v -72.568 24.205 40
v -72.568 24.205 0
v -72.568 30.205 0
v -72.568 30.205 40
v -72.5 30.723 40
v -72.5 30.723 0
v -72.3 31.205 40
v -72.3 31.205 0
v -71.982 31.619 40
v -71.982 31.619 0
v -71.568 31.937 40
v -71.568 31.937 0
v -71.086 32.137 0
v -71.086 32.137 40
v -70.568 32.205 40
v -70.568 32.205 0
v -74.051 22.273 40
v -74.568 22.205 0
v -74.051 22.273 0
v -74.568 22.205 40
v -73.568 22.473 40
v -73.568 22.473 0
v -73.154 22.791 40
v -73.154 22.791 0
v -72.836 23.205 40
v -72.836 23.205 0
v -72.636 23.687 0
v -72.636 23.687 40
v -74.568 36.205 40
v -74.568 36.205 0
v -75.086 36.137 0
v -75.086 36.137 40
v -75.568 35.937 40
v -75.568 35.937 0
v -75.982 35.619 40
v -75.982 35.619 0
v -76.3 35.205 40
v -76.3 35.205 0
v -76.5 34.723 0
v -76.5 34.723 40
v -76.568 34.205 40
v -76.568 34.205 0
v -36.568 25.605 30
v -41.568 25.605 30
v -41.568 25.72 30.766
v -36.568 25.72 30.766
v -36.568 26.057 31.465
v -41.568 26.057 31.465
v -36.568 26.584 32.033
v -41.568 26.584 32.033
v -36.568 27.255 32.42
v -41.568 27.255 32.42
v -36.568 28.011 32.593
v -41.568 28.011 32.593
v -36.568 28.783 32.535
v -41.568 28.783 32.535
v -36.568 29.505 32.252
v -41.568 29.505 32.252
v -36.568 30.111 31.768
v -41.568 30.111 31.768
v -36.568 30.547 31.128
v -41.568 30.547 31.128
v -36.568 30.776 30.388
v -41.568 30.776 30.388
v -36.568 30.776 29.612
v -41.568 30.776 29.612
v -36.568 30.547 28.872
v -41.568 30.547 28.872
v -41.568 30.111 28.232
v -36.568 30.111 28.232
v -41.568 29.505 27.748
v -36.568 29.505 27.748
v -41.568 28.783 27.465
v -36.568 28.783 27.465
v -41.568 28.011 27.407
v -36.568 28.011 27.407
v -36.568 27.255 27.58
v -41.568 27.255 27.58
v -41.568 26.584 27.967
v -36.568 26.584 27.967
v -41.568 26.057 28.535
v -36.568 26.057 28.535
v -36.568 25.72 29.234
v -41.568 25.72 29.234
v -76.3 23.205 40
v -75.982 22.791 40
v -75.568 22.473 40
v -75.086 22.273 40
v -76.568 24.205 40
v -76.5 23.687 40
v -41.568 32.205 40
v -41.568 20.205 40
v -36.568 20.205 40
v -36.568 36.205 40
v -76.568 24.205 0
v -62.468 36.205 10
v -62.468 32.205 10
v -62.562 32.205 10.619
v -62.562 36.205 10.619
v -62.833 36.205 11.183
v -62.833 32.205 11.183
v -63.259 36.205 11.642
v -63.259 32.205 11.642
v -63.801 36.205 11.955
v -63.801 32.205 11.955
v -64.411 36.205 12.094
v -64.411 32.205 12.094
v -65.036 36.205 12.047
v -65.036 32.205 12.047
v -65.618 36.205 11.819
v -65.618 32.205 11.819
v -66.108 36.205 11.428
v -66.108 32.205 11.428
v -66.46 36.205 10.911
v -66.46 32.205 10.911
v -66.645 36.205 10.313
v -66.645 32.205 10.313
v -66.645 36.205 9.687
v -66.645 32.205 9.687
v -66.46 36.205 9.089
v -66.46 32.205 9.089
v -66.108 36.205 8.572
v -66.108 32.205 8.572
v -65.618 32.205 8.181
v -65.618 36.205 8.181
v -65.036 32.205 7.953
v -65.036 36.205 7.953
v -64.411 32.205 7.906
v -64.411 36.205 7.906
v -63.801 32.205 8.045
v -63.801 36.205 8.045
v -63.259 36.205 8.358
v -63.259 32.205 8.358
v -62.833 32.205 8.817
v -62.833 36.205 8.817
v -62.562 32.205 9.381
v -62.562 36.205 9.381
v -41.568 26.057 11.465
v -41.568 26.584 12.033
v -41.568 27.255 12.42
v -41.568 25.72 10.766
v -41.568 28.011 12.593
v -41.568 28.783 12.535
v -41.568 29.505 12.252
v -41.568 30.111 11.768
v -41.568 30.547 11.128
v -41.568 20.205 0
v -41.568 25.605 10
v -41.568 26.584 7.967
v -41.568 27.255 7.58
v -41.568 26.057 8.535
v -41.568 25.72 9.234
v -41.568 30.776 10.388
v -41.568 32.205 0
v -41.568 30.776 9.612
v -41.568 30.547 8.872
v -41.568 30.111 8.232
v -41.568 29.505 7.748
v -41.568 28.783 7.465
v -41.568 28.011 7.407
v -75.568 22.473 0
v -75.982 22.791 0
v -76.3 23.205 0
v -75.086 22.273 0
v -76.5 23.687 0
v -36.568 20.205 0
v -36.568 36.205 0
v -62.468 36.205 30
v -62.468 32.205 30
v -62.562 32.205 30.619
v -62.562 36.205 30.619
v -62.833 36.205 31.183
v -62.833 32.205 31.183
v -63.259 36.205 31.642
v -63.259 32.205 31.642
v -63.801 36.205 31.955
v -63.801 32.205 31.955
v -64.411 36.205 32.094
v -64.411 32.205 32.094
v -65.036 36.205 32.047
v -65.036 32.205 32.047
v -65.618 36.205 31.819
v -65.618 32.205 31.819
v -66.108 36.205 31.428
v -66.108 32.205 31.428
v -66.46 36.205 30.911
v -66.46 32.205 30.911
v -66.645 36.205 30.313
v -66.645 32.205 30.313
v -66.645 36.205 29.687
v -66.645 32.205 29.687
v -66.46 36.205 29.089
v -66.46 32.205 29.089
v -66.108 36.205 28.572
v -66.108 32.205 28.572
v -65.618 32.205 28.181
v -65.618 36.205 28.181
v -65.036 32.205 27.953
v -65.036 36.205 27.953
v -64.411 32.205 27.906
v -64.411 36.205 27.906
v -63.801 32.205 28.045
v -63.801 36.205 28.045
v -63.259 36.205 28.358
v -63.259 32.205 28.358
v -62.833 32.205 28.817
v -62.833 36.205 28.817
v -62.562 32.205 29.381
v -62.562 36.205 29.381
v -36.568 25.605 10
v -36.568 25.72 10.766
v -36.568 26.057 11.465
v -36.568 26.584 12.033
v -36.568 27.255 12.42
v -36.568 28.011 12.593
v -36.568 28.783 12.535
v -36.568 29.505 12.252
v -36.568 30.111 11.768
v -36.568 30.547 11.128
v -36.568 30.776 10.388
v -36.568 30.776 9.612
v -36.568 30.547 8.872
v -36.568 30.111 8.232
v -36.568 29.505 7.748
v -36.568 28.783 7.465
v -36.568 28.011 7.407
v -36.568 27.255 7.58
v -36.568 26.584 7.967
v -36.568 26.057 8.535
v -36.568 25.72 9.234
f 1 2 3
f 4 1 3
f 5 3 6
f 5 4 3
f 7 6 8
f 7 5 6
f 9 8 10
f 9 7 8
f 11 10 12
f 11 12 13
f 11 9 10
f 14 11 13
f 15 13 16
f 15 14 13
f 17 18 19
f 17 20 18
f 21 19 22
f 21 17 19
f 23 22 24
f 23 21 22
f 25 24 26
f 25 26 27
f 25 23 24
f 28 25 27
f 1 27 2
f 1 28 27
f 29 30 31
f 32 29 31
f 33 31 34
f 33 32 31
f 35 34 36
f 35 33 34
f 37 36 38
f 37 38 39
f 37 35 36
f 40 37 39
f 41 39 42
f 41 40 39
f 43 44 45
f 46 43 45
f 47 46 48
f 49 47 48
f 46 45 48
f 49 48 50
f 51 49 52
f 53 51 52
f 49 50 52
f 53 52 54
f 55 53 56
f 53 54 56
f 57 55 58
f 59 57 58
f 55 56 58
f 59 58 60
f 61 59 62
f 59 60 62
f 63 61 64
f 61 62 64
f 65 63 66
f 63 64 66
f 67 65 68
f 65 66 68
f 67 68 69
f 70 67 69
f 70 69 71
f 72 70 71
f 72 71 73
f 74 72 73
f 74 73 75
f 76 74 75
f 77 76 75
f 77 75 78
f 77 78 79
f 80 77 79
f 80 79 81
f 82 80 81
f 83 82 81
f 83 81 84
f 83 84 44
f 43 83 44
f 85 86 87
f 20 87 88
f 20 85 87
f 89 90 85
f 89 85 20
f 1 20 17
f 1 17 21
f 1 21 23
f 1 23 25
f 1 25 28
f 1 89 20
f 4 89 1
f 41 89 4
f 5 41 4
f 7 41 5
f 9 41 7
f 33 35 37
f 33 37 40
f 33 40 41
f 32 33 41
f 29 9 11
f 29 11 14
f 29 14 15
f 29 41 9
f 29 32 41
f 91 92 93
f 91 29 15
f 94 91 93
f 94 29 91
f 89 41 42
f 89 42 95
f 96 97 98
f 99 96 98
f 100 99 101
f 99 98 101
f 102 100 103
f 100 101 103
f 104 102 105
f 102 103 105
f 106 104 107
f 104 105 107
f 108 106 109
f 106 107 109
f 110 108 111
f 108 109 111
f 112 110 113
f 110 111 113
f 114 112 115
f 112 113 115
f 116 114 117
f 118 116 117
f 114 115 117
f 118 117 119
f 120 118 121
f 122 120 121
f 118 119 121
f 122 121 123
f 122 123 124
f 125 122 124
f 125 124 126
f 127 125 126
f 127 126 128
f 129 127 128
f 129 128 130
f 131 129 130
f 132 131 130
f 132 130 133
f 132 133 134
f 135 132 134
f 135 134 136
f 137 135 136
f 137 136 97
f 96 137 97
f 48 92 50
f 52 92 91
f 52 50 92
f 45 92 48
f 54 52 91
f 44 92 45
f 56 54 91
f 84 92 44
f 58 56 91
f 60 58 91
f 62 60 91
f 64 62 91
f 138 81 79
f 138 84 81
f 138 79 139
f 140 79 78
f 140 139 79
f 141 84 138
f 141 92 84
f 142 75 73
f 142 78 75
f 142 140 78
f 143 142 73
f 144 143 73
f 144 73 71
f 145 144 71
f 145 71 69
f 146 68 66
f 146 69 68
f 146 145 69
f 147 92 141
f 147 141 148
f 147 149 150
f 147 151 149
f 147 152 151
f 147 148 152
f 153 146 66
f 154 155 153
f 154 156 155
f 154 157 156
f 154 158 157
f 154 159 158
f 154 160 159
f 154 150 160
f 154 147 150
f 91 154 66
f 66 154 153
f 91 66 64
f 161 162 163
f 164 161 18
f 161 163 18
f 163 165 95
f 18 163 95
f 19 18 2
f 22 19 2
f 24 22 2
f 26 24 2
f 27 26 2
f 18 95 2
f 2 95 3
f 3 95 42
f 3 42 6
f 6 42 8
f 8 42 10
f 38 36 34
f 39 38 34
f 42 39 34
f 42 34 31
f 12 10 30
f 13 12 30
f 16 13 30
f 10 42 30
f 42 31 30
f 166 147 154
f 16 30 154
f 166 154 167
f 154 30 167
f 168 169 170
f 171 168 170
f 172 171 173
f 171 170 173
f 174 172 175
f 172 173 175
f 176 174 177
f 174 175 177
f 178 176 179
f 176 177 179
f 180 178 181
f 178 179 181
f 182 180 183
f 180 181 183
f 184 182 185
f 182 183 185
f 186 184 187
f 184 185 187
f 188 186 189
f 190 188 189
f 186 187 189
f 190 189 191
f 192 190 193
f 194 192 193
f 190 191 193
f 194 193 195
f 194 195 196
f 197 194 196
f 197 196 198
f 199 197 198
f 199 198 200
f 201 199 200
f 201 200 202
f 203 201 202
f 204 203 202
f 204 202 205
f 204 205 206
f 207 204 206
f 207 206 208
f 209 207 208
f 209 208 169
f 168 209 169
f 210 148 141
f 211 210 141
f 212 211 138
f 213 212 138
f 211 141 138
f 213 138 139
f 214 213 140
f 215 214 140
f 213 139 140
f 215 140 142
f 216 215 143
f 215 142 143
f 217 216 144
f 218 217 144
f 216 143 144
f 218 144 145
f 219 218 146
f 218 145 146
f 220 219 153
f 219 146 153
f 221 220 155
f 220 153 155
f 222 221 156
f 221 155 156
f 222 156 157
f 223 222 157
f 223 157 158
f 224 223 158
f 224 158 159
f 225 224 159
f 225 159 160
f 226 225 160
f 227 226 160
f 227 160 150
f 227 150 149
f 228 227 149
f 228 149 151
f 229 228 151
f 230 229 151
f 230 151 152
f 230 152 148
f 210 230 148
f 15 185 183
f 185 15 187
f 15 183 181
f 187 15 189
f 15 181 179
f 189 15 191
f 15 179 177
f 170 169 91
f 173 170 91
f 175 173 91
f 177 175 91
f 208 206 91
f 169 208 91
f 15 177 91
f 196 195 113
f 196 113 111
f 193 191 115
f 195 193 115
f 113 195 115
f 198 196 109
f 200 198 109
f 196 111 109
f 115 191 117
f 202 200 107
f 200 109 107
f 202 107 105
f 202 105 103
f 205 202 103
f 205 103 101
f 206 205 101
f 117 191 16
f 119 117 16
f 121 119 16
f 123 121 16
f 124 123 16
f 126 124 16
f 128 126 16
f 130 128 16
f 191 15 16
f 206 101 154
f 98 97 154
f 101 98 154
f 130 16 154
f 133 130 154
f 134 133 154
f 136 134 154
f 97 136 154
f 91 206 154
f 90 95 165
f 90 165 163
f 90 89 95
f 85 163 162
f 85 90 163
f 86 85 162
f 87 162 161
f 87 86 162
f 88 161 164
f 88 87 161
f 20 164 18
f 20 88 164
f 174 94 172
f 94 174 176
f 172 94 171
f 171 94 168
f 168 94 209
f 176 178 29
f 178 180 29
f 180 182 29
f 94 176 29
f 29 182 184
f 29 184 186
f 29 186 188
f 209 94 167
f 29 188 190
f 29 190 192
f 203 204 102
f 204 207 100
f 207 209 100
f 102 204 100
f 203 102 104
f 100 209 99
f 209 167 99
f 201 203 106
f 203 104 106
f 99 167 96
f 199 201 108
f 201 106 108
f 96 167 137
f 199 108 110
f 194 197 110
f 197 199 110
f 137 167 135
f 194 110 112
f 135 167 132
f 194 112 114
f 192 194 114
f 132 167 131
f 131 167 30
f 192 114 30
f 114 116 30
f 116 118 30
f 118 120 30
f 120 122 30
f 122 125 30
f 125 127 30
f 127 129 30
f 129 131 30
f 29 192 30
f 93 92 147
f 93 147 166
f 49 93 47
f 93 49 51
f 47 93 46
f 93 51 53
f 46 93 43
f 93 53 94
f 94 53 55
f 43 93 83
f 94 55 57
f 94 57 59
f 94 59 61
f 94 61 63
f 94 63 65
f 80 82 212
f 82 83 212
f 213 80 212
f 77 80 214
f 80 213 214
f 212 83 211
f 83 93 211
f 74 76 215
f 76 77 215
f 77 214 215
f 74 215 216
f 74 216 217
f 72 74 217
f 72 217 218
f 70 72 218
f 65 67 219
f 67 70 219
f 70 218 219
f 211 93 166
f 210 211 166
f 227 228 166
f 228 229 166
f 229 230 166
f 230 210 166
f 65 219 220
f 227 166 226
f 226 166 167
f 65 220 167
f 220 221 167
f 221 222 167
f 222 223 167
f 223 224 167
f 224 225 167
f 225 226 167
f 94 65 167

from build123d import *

# Parameters (mm, degrees)
F0_W     = 4
F0_H     = 10
F0_W_2   = 5
F0_H_2   = 12
F1_DEPTH = 40
F3_R     = 1.99999
F4_D     = 5.2
F4_DEPTH = 12
F4_TIP   = 1.5622376095
F6_D     = 4.2
F6_DEPTH = 12
F6_TIP   = 1.2618073


# Not quite as in the source:
# - a fillet or chamfer is up to 0.001 mm smaller than in the source, because OpenCascade refuses the exact size


with BuildPart() as f1:
    # F0 (on Top) → F1 (new body)
    with BuildSketch(Plane.XY):
        Polygon((-36.5682695345, 36.2048765272), (-76.5682695345, 36.2048765272), (-76.5682695345, 32.2048765272), (-72.5682695345, 32.2048765272), (-41.5682695345, 32.2048765272), (-36.5682695345, 32.2048765272), align=None)
        with Locations((-74.5682695345, 27.2048765272)):
            Rectangle(F0_W, F0_H)
        with Locations((-39.0682695345, 26.2048765272)):
            Rectangle(F0_W_2, F0_H_2)
    extrude(amount=F1_DEPTH)

    # F3 (radius 2 in the source; OpenCascade refuses exactly that, so slightly less here)
    f3_edges = [f1.edges().sort_by_distance(p)[0] for p in [
        (-76.56827, 36.204877, 20),
        (-72.56827, 32.204877, 20),
        (-76.56827, 22.204877, 20),
        (-72.56827, 22.204877, 20),
    ]]
    fillet(f3_edges, radius=F3_R)

    # F4
    with Locations(Plane.YZ.offset(-36.5682695345)):
        with Locations((28.2048765272, 10), (28.2048765272, 30)):
            Hole(F4_D / 2, depth=F4_DEPTH)
            with Locations((0, 0, -(F4_DEPTH + F4_TIP / 2))):  # 118° drill point
                Cone(0, F4_D / 2, F4_TIP, mode=Mode.SUBTRACT)

    # F6
    with Locations(Plane(origin=(0, 36.2048765272, 0), x_dir=(-1, 0, 0), z_dir=(0, 1, 0))):
        with Locations((64.5682695345, 10), (64.5682695345, 30)):
            Hole(F6_D / 2, depth=F6_DEPTH)
            with Locations((0, 0, -(F6_DEPTH + F6_TIP / 2))):  # 118° drill point
                Cone(0, F6_D / 2, F6_TIP, mode=Mode.SUBTRACT)


solid = f1.part
